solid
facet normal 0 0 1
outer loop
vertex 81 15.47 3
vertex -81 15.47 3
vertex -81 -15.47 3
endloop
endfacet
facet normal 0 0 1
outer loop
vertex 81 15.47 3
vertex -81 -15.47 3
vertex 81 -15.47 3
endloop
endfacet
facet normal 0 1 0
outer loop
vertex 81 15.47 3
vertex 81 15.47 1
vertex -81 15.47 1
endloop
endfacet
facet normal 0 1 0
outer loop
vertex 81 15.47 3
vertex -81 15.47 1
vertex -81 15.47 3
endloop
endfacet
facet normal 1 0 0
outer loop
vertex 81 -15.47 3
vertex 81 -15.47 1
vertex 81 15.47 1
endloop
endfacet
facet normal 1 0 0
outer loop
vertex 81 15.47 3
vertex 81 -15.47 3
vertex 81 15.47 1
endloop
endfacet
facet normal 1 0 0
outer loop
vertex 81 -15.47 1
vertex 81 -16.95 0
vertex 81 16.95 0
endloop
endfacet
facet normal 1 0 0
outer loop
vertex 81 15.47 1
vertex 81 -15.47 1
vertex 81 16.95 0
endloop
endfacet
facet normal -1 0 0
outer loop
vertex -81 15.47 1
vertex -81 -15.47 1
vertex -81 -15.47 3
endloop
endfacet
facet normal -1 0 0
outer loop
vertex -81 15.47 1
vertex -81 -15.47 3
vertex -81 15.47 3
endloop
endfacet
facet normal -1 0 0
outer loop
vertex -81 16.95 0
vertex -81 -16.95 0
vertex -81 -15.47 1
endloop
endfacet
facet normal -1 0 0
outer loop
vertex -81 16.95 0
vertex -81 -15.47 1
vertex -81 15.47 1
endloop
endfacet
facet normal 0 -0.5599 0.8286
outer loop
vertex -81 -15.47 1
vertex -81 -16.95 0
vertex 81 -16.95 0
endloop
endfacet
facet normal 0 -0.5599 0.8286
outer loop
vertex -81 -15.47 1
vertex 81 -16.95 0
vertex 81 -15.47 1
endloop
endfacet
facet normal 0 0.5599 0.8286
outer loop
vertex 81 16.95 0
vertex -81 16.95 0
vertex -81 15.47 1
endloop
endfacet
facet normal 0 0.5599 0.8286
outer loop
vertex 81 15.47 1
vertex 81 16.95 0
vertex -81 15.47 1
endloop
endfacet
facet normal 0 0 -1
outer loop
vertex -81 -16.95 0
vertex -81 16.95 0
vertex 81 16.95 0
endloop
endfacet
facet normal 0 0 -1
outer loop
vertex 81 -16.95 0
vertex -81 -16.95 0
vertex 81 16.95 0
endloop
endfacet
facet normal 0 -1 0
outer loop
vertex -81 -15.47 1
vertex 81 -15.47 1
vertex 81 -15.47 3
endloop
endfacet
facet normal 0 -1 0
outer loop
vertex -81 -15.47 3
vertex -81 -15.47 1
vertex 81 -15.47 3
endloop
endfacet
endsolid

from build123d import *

# Parameters (mm, degrees)
SKETCH_W             = 162
SKETCH_H             = 33.9
PAD_DEPTH            = 3
POCKET_DEPTH         = 81.001
POCKET_DEPTH_BACK    = 81.001
POCKET001_DEPTH      = 81.001
POCKET001_DEPTH_BACK = 81.001


with BuildPart() as part:
    # Sketch → Pad (new body)
    with BuildSketch(Plane.XY):
        Rectangle(SKETCH_W, SKETCH_H)
    extrude(amount=PAD_DEPTH)

    # Sketch001 → Pocket (cut, two sides)
    with BuildSketch(Plane.YZ) as pocket_sk:
        Polygon((15.47, 3), (16.95, 3), (16.95, 0), (15.47, 1), align=None)
    extrude(amount=-POCKET_DEPTH, mode=Mode.SUBTRACT)
    extrude(pocket_sk.sketch, amount=POCKET_DEPTH_BACK, mode=Mode.SUBTRACT)

    # MirroredSketch → Pocket001 (cut, two sides)
    with BuildSketch(Plane.YZ) as pocket001_sk:
        Polygon((-15.47, 3), (-16.95, 3), (-16.95, 0), (-15.47, 1), align=None)
    extrude(amount=-POCKET001_DEPTH, mode=Mode.SUBTRACT)
    extrude(pocket001_sk.sketch, amount=POCKET001_DEPTH_BACK, mode=Mode.SUBTRACT)


solid = part.part
